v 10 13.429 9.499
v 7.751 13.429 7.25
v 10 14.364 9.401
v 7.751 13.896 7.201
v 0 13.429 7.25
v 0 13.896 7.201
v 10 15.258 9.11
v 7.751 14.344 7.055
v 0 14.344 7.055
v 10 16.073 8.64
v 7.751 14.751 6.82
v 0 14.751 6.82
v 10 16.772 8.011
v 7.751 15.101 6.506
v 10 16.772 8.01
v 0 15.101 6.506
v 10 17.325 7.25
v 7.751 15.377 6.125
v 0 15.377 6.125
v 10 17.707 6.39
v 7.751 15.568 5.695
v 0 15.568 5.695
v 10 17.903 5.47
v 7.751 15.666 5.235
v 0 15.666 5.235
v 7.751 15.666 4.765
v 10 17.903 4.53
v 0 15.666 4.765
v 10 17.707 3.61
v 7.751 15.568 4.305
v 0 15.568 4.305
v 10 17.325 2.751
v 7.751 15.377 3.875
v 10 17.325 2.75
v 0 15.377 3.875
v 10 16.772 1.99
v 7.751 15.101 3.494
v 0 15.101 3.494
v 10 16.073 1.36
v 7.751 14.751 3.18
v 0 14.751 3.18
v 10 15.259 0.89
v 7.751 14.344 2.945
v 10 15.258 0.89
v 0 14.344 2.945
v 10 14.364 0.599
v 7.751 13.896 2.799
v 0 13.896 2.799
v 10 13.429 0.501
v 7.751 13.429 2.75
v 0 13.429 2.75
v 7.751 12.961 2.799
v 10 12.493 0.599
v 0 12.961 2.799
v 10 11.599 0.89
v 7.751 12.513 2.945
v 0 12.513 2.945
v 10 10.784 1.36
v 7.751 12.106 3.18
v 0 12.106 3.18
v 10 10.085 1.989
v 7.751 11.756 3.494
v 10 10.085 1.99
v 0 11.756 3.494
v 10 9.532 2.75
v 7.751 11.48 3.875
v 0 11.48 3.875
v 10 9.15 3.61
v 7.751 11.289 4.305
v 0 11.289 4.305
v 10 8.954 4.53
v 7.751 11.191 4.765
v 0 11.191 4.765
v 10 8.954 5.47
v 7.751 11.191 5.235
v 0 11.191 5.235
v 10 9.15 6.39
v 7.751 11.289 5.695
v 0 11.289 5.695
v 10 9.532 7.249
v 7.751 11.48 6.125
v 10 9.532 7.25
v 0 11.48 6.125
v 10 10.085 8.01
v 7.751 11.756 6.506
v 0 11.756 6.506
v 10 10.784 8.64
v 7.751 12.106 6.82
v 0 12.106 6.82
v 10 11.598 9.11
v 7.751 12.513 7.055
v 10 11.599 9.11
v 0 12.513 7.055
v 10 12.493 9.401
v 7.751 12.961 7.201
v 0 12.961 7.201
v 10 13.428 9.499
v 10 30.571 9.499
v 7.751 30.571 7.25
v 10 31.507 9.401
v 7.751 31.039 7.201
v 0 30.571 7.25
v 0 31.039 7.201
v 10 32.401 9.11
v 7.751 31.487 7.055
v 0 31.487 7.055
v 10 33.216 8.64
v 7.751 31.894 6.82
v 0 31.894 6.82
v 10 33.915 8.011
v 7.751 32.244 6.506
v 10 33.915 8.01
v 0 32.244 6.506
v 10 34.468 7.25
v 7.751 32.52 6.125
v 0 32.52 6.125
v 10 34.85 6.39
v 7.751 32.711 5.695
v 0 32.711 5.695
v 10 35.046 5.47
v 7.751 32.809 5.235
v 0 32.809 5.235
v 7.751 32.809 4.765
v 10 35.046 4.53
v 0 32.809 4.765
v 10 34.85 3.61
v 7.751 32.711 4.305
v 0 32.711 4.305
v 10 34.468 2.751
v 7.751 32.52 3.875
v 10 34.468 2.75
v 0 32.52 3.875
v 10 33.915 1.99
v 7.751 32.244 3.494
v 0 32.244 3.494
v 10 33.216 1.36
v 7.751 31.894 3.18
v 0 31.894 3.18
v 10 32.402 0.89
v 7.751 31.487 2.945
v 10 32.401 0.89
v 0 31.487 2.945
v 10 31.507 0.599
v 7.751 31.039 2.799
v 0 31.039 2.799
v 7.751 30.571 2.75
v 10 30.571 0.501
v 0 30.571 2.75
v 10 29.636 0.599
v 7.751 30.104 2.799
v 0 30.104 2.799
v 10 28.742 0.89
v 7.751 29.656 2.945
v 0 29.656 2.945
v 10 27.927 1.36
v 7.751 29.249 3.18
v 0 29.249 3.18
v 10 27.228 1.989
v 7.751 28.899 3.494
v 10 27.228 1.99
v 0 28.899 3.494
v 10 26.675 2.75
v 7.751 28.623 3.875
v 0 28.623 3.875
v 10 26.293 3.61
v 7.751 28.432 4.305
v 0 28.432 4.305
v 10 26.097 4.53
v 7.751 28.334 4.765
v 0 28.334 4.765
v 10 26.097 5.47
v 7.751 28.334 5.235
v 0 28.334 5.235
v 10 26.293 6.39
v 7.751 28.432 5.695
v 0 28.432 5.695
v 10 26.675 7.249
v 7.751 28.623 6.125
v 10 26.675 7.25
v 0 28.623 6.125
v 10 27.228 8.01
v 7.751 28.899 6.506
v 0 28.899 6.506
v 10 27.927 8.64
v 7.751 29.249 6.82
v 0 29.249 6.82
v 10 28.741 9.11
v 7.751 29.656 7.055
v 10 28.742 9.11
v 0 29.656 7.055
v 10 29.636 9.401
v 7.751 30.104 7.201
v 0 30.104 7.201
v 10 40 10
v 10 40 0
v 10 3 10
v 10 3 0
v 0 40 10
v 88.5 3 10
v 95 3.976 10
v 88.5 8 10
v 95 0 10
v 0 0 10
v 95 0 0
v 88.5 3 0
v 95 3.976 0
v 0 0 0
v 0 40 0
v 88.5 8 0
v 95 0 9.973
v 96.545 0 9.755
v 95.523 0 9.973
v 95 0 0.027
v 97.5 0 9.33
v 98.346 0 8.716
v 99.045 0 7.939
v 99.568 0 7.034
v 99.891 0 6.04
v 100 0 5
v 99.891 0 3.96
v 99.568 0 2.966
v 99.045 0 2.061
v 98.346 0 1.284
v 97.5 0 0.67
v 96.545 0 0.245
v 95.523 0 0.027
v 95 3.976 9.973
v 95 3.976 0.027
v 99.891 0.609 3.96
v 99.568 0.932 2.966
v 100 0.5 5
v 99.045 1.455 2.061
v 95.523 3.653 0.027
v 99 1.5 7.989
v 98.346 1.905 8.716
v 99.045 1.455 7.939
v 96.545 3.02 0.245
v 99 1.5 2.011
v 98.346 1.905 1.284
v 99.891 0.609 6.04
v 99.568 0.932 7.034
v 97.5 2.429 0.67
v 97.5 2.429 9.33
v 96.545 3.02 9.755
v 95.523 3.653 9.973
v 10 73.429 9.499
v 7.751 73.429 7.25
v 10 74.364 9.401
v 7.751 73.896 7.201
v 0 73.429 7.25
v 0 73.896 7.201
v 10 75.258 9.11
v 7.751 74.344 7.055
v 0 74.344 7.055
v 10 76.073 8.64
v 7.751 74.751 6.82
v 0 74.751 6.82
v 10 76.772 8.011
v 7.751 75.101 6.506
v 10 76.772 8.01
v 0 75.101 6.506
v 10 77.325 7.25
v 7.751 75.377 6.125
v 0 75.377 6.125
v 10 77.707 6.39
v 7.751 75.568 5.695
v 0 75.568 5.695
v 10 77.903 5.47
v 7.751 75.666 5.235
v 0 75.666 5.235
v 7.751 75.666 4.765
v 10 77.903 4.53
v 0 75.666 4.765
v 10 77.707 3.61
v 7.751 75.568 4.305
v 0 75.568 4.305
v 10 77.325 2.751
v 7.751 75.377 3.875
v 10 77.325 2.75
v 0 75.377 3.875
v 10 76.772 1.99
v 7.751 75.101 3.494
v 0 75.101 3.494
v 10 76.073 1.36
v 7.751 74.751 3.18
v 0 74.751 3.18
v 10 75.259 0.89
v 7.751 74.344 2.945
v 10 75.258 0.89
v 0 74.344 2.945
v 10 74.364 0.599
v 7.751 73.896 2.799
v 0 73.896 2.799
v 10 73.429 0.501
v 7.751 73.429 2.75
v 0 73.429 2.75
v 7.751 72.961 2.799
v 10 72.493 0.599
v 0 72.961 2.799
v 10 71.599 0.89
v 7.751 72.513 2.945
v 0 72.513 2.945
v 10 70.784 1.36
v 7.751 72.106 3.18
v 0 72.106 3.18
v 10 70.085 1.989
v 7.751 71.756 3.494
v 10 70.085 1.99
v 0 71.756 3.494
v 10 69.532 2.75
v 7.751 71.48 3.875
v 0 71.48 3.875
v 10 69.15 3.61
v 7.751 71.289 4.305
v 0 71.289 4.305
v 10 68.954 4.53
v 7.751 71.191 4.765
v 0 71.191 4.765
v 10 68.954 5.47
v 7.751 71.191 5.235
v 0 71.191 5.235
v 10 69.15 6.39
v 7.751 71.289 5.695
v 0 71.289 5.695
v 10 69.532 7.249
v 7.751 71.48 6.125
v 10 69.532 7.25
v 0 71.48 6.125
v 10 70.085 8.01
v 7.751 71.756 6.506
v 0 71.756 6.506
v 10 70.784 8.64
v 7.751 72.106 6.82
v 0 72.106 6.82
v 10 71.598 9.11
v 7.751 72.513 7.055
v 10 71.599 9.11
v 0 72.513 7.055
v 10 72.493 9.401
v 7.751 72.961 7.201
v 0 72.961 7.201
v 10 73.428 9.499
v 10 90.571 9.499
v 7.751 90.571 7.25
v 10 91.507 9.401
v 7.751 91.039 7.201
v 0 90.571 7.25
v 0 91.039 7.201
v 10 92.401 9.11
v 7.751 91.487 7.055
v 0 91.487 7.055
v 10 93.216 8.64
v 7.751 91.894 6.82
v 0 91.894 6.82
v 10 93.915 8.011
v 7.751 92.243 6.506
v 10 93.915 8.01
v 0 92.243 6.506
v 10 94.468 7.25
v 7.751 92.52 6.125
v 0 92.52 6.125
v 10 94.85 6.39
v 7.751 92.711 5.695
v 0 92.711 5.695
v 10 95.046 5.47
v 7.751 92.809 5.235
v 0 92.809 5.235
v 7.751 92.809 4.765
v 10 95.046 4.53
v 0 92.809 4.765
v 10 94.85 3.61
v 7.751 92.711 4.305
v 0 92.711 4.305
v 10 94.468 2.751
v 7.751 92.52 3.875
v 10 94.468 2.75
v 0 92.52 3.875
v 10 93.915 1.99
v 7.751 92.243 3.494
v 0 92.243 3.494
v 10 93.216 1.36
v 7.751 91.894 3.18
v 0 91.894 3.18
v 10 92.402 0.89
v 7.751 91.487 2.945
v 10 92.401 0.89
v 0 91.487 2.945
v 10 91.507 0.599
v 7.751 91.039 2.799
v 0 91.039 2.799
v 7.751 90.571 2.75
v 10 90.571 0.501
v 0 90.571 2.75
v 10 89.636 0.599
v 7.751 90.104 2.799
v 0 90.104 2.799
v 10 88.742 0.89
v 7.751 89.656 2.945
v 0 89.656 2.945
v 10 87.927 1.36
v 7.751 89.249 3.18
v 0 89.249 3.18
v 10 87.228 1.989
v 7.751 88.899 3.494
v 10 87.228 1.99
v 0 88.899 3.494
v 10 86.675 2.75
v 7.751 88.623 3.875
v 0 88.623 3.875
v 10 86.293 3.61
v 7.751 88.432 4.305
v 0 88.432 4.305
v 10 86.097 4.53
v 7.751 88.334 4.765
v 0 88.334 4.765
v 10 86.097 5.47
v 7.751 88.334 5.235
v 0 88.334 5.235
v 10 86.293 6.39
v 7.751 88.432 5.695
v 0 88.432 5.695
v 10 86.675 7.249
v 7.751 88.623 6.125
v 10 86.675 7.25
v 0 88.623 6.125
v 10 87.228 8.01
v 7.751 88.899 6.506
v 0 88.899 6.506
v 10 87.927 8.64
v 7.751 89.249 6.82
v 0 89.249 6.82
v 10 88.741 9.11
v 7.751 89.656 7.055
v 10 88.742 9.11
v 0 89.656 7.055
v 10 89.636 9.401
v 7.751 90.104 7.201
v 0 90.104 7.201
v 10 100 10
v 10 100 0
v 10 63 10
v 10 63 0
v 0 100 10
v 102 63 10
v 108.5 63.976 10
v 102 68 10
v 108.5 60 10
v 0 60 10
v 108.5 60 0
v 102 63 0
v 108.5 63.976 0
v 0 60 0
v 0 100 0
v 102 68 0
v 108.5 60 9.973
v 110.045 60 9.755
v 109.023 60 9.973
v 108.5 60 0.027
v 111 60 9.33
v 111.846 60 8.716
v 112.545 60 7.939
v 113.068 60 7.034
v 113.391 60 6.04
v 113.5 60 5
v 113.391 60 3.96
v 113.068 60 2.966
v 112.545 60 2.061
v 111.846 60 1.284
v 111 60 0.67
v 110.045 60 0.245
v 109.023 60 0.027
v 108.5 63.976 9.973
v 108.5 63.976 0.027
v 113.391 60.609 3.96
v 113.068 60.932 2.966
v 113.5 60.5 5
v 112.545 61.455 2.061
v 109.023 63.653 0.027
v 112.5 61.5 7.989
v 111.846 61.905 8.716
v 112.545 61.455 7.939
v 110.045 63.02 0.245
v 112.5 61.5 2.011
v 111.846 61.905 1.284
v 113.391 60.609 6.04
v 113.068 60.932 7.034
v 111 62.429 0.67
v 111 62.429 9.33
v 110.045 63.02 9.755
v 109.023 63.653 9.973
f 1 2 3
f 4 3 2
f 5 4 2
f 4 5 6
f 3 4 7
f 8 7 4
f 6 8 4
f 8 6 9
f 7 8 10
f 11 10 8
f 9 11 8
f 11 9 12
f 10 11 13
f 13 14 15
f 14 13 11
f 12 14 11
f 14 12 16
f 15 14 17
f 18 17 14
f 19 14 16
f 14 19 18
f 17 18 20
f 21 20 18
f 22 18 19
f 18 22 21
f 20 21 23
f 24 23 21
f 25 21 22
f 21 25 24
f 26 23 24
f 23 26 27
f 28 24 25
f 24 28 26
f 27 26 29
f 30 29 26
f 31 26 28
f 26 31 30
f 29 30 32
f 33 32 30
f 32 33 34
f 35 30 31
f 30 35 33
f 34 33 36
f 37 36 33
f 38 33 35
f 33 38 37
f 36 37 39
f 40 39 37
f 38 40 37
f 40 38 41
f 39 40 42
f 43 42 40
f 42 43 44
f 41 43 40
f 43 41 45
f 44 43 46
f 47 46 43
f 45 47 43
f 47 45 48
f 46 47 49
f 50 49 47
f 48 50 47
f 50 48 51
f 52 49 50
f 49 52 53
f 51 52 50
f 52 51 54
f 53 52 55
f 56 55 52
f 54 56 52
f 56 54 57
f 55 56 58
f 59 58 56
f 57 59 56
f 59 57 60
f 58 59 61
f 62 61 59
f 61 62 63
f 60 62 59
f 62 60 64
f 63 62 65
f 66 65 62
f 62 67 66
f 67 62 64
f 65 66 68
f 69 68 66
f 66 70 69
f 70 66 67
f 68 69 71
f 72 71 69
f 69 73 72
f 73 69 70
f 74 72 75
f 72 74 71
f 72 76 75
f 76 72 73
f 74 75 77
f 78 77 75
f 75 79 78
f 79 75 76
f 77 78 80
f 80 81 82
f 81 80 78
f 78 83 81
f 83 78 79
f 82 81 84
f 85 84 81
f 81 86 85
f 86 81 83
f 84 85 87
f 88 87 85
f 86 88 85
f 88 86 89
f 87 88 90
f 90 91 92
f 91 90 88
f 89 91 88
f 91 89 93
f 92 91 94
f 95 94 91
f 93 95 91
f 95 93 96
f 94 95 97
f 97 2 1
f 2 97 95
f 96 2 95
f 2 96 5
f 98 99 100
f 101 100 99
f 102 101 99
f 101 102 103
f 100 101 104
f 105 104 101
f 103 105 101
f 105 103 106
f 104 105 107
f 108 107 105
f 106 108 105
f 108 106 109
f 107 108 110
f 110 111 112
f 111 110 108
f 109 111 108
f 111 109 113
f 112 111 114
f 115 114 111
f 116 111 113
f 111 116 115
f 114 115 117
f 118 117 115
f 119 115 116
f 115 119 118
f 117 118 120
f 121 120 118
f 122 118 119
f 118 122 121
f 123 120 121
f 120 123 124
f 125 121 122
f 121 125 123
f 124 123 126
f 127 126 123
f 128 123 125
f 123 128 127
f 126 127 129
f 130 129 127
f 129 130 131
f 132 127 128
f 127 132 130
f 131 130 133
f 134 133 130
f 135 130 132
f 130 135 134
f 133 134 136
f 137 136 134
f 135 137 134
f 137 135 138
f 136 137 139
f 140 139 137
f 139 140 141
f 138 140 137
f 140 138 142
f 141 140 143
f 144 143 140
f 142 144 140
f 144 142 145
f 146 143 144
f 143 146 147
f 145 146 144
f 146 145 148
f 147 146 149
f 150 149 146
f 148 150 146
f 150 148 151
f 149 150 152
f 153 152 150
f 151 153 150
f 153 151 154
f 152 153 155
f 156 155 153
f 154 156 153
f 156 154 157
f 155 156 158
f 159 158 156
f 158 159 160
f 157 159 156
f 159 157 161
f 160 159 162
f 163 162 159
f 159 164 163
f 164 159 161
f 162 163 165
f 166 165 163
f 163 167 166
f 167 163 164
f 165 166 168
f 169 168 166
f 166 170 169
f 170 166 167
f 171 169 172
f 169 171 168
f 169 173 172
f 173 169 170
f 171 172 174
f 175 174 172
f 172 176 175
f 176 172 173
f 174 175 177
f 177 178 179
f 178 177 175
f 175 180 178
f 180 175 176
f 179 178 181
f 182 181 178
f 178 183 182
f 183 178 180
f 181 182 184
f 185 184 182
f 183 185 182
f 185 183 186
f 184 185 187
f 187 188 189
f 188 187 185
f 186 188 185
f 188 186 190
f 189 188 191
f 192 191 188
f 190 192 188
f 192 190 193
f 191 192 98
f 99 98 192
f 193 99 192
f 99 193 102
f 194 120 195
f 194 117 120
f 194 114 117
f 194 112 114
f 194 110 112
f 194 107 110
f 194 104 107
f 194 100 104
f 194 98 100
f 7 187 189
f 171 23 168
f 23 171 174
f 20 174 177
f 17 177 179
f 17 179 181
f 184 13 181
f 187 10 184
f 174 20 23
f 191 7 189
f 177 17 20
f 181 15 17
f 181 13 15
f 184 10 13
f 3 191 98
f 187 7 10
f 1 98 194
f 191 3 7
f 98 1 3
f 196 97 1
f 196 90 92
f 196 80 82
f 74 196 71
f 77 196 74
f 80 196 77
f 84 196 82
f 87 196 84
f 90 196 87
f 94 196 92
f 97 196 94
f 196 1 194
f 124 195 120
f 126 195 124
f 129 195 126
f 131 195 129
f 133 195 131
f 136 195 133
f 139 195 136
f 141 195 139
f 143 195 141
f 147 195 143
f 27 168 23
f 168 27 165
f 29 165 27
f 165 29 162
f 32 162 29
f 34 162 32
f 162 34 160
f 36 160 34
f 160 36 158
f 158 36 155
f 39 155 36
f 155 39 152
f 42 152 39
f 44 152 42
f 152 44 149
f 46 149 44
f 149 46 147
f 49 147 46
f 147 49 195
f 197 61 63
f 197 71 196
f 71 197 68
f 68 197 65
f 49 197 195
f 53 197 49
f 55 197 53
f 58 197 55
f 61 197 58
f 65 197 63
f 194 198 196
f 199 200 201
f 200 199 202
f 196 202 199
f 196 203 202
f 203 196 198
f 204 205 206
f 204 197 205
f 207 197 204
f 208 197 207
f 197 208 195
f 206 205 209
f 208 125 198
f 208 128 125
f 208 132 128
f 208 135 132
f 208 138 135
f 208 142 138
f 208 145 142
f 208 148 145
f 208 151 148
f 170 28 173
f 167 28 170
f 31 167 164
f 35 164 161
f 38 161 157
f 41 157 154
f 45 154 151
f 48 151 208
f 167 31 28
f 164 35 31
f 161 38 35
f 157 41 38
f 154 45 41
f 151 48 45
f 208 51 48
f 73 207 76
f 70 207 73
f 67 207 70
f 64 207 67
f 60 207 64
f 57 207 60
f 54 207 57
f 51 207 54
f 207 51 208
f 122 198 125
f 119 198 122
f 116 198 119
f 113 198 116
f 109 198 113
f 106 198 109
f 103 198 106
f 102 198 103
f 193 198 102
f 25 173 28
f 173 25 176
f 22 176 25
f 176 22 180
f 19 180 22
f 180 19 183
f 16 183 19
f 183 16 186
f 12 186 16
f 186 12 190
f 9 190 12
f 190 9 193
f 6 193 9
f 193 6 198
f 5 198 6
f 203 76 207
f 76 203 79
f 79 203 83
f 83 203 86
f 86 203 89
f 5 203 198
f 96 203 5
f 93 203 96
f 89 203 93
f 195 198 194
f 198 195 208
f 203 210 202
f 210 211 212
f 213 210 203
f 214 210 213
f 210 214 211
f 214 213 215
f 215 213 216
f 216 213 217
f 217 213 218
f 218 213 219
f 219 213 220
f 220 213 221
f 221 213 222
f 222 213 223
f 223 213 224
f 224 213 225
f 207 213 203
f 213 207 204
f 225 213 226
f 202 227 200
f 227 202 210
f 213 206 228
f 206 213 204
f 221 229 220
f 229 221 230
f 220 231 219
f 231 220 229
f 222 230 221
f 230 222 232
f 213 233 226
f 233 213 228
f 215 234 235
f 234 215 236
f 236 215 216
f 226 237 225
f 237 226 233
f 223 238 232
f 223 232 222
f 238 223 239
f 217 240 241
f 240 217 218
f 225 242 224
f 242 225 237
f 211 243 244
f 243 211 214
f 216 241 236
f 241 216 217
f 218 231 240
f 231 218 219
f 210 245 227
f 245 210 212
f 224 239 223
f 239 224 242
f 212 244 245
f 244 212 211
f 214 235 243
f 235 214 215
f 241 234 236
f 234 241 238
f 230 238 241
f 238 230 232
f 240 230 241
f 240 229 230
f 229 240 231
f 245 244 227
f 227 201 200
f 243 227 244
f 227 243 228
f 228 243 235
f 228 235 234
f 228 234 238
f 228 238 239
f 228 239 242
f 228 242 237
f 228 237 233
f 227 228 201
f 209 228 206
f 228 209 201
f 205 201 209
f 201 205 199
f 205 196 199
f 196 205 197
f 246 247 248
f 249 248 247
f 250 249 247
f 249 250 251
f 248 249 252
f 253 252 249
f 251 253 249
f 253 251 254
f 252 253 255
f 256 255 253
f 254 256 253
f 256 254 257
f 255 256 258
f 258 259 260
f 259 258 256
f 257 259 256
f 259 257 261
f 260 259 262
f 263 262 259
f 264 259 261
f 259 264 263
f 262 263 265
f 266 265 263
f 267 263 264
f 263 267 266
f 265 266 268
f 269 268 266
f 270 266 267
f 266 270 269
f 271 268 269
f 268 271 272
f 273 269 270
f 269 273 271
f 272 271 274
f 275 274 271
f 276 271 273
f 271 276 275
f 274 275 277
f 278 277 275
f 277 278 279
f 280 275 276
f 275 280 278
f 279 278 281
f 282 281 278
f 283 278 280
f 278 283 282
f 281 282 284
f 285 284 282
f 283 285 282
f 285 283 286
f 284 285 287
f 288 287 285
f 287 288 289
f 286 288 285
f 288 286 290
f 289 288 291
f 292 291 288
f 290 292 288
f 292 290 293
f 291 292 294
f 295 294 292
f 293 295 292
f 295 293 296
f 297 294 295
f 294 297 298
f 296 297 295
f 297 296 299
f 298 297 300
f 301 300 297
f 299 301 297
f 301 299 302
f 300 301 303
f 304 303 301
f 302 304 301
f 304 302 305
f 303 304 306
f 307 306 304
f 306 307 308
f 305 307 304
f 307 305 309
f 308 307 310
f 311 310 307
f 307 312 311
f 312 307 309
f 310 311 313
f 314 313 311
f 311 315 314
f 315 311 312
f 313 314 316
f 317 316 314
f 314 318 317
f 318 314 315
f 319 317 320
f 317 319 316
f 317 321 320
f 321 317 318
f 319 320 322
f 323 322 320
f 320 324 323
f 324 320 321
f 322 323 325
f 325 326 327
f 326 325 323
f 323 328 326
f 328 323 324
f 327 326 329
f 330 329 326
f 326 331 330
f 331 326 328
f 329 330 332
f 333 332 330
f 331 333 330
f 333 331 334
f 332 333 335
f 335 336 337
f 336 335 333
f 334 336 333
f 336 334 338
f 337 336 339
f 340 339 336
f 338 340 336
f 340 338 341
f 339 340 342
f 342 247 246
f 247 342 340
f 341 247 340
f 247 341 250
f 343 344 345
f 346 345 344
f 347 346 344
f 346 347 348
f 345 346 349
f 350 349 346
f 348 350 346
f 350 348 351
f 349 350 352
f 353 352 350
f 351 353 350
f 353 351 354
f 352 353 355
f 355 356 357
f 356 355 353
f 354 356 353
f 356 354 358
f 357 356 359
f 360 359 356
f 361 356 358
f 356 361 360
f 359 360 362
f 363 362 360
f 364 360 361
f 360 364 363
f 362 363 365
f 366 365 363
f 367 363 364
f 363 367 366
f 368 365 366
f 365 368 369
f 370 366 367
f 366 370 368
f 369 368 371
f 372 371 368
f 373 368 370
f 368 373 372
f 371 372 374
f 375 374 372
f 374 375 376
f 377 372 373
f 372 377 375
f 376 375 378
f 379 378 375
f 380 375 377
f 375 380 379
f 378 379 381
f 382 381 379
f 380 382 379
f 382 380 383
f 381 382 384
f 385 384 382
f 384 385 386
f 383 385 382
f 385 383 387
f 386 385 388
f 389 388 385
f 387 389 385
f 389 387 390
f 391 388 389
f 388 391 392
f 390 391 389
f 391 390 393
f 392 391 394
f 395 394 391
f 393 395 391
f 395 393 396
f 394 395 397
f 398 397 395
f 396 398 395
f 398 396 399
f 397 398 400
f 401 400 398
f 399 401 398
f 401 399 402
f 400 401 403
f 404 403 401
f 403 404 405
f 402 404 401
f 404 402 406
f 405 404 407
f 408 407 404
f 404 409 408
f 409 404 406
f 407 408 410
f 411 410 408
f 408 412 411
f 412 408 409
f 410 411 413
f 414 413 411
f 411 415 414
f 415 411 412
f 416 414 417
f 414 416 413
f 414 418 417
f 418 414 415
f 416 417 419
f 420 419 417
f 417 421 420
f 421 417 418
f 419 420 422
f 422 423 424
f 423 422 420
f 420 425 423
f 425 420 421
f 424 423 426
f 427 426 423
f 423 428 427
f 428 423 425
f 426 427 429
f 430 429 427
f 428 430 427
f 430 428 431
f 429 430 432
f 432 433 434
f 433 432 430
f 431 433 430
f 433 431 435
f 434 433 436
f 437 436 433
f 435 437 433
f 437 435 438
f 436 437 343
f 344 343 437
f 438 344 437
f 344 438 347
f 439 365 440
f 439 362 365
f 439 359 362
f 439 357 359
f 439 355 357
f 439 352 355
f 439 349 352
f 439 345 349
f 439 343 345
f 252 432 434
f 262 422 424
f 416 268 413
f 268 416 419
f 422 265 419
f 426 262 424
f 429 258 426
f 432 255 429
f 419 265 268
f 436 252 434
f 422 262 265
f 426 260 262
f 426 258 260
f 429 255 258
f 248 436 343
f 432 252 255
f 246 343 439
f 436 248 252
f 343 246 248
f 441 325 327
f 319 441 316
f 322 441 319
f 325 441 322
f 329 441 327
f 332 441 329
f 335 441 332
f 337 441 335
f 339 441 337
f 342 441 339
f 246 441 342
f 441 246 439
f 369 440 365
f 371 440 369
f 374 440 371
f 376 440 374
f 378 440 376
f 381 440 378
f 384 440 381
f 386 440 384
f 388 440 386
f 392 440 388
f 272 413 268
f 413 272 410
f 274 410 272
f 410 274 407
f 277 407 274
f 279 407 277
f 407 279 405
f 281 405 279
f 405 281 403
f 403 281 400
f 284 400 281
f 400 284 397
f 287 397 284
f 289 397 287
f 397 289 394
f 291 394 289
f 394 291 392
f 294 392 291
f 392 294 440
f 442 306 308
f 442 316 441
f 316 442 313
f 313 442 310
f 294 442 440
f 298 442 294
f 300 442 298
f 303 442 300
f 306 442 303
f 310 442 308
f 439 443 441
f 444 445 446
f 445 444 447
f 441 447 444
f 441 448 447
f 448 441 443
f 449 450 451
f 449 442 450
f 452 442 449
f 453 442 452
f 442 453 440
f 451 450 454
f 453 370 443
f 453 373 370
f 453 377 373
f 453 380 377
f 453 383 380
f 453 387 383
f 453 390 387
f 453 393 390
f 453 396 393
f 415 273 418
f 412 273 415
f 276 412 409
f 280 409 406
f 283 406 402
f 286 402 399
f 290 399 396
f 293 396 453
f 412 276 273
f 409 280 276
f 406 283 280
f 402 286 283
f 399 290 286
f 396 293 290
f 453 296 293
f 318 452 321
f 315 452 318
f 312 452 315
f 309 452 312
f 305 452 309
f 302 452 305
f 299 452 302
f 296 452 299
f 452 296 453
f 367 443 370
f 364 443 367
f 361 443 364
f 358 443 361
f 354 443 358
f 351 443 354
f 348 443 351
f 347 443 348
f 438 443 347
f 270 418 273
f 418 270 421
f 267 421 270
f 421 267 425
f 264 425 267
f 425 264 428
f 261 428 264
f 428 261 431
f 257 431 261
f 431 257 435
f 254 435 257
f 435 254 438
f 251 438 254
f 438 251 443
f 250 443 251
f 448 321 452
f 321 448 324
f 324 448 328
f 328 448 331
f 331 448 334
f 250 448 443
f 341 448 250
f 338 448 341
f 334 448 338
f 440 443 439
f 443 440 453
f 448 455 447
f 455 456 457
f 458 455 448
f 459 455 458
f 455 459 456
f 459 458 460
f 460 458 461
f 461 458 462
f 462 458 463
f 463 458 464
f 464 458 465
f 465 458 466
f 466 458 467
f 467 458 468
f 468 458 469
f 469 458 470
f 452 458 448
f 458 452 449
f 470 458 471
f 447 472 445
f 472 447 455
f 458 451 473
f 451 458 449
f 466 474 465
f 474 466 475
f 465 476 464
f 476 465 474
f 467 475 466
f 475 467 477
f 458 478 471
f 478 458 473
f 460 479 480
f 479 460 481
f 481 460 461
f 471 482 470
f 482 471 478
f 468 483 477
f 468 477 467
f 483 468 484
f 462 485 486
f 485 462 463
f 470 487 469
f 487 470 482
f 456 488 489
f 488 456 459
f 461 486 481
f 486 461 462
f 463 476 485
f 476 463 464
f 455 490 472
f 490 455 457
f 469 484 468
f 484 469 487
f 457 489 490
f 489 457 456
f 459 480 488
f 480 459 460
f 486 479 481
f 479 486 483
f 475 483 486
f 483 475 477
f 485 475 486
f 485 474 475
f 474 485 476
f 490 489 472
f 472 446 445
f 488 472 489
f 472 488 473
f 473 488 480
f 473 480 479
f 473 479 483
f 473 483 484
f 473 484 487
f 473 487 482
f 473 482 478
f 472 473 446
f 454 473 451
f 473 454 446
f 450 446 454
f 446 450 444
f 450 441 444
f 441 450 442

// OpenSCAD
$fn = 30;
e = 0.001; // epsilon

module baby_gate_latch(span) {
  margin = 2;

  span = span + margin;

  //----------------------------------------------------------------
  // base

  // screw hole dimensions
  r1 = 4.5 / 2;
  r2 = 9 / 2;
  bevel = 2;

  // base dimensions
  base_thickness = 10;
  base_length = 40;

  difference() {
    cube([ base_thickness, base_length, width ]);
    for (i = [ 2, 5 ]) {
      h = base_thickness + 2 * e;
      translate([ -e, 2 + i * base_length / 7, width / 2 ])
          rotate(a = 90, v = [ 0, 1, 0 ]) rotate_extrude() polygon([
            [ 0, 0 ],
            [ r1, 0 ],
            [ r1, h - (r2 - r1) ],
            [ r2, h ],
            [ 0, h ],
          ]);
    }
  }

  //----------------------------------------------------------------
  // stem and arrow

  // arrow dimensions
  arrowhead_width = 8;
  arrowhead_length = 11.5;
  tip = 0.5;
  arrow_bevel = 1;

  // stem dimensions
  width = 10;
  inner = span;
  outer = span + arrowhead_length;
  thickness = 3;

  intersection() {
    linear_extrude(height = width) {
      polygon([
        [ 0, 0 ],
        [ outer, 0 ],
        [ outer, tip ],
        [ outer - arrow_bevel, tip + arrow_bevel ],
        [ inner, arrowhead_width ],
        [ inner, thickness ],
        [ 0, thickness ],
      ]);
    }
    union() {
      cube([ outer - width / 2, arrowhead_width, base_thickness ]);
      translate([ outer - width / 2, 0, width / 2 ]) rotate(90, [ -1, 0, 0 ]) {
        cylinder(h = arrowhead_width, r = width / 2);
      }
    }
  }
}

baby_gate_latch(span = 86.5);
translate([ 0, 60, 0 ]) { baby_gate_latch(span = 100); }
